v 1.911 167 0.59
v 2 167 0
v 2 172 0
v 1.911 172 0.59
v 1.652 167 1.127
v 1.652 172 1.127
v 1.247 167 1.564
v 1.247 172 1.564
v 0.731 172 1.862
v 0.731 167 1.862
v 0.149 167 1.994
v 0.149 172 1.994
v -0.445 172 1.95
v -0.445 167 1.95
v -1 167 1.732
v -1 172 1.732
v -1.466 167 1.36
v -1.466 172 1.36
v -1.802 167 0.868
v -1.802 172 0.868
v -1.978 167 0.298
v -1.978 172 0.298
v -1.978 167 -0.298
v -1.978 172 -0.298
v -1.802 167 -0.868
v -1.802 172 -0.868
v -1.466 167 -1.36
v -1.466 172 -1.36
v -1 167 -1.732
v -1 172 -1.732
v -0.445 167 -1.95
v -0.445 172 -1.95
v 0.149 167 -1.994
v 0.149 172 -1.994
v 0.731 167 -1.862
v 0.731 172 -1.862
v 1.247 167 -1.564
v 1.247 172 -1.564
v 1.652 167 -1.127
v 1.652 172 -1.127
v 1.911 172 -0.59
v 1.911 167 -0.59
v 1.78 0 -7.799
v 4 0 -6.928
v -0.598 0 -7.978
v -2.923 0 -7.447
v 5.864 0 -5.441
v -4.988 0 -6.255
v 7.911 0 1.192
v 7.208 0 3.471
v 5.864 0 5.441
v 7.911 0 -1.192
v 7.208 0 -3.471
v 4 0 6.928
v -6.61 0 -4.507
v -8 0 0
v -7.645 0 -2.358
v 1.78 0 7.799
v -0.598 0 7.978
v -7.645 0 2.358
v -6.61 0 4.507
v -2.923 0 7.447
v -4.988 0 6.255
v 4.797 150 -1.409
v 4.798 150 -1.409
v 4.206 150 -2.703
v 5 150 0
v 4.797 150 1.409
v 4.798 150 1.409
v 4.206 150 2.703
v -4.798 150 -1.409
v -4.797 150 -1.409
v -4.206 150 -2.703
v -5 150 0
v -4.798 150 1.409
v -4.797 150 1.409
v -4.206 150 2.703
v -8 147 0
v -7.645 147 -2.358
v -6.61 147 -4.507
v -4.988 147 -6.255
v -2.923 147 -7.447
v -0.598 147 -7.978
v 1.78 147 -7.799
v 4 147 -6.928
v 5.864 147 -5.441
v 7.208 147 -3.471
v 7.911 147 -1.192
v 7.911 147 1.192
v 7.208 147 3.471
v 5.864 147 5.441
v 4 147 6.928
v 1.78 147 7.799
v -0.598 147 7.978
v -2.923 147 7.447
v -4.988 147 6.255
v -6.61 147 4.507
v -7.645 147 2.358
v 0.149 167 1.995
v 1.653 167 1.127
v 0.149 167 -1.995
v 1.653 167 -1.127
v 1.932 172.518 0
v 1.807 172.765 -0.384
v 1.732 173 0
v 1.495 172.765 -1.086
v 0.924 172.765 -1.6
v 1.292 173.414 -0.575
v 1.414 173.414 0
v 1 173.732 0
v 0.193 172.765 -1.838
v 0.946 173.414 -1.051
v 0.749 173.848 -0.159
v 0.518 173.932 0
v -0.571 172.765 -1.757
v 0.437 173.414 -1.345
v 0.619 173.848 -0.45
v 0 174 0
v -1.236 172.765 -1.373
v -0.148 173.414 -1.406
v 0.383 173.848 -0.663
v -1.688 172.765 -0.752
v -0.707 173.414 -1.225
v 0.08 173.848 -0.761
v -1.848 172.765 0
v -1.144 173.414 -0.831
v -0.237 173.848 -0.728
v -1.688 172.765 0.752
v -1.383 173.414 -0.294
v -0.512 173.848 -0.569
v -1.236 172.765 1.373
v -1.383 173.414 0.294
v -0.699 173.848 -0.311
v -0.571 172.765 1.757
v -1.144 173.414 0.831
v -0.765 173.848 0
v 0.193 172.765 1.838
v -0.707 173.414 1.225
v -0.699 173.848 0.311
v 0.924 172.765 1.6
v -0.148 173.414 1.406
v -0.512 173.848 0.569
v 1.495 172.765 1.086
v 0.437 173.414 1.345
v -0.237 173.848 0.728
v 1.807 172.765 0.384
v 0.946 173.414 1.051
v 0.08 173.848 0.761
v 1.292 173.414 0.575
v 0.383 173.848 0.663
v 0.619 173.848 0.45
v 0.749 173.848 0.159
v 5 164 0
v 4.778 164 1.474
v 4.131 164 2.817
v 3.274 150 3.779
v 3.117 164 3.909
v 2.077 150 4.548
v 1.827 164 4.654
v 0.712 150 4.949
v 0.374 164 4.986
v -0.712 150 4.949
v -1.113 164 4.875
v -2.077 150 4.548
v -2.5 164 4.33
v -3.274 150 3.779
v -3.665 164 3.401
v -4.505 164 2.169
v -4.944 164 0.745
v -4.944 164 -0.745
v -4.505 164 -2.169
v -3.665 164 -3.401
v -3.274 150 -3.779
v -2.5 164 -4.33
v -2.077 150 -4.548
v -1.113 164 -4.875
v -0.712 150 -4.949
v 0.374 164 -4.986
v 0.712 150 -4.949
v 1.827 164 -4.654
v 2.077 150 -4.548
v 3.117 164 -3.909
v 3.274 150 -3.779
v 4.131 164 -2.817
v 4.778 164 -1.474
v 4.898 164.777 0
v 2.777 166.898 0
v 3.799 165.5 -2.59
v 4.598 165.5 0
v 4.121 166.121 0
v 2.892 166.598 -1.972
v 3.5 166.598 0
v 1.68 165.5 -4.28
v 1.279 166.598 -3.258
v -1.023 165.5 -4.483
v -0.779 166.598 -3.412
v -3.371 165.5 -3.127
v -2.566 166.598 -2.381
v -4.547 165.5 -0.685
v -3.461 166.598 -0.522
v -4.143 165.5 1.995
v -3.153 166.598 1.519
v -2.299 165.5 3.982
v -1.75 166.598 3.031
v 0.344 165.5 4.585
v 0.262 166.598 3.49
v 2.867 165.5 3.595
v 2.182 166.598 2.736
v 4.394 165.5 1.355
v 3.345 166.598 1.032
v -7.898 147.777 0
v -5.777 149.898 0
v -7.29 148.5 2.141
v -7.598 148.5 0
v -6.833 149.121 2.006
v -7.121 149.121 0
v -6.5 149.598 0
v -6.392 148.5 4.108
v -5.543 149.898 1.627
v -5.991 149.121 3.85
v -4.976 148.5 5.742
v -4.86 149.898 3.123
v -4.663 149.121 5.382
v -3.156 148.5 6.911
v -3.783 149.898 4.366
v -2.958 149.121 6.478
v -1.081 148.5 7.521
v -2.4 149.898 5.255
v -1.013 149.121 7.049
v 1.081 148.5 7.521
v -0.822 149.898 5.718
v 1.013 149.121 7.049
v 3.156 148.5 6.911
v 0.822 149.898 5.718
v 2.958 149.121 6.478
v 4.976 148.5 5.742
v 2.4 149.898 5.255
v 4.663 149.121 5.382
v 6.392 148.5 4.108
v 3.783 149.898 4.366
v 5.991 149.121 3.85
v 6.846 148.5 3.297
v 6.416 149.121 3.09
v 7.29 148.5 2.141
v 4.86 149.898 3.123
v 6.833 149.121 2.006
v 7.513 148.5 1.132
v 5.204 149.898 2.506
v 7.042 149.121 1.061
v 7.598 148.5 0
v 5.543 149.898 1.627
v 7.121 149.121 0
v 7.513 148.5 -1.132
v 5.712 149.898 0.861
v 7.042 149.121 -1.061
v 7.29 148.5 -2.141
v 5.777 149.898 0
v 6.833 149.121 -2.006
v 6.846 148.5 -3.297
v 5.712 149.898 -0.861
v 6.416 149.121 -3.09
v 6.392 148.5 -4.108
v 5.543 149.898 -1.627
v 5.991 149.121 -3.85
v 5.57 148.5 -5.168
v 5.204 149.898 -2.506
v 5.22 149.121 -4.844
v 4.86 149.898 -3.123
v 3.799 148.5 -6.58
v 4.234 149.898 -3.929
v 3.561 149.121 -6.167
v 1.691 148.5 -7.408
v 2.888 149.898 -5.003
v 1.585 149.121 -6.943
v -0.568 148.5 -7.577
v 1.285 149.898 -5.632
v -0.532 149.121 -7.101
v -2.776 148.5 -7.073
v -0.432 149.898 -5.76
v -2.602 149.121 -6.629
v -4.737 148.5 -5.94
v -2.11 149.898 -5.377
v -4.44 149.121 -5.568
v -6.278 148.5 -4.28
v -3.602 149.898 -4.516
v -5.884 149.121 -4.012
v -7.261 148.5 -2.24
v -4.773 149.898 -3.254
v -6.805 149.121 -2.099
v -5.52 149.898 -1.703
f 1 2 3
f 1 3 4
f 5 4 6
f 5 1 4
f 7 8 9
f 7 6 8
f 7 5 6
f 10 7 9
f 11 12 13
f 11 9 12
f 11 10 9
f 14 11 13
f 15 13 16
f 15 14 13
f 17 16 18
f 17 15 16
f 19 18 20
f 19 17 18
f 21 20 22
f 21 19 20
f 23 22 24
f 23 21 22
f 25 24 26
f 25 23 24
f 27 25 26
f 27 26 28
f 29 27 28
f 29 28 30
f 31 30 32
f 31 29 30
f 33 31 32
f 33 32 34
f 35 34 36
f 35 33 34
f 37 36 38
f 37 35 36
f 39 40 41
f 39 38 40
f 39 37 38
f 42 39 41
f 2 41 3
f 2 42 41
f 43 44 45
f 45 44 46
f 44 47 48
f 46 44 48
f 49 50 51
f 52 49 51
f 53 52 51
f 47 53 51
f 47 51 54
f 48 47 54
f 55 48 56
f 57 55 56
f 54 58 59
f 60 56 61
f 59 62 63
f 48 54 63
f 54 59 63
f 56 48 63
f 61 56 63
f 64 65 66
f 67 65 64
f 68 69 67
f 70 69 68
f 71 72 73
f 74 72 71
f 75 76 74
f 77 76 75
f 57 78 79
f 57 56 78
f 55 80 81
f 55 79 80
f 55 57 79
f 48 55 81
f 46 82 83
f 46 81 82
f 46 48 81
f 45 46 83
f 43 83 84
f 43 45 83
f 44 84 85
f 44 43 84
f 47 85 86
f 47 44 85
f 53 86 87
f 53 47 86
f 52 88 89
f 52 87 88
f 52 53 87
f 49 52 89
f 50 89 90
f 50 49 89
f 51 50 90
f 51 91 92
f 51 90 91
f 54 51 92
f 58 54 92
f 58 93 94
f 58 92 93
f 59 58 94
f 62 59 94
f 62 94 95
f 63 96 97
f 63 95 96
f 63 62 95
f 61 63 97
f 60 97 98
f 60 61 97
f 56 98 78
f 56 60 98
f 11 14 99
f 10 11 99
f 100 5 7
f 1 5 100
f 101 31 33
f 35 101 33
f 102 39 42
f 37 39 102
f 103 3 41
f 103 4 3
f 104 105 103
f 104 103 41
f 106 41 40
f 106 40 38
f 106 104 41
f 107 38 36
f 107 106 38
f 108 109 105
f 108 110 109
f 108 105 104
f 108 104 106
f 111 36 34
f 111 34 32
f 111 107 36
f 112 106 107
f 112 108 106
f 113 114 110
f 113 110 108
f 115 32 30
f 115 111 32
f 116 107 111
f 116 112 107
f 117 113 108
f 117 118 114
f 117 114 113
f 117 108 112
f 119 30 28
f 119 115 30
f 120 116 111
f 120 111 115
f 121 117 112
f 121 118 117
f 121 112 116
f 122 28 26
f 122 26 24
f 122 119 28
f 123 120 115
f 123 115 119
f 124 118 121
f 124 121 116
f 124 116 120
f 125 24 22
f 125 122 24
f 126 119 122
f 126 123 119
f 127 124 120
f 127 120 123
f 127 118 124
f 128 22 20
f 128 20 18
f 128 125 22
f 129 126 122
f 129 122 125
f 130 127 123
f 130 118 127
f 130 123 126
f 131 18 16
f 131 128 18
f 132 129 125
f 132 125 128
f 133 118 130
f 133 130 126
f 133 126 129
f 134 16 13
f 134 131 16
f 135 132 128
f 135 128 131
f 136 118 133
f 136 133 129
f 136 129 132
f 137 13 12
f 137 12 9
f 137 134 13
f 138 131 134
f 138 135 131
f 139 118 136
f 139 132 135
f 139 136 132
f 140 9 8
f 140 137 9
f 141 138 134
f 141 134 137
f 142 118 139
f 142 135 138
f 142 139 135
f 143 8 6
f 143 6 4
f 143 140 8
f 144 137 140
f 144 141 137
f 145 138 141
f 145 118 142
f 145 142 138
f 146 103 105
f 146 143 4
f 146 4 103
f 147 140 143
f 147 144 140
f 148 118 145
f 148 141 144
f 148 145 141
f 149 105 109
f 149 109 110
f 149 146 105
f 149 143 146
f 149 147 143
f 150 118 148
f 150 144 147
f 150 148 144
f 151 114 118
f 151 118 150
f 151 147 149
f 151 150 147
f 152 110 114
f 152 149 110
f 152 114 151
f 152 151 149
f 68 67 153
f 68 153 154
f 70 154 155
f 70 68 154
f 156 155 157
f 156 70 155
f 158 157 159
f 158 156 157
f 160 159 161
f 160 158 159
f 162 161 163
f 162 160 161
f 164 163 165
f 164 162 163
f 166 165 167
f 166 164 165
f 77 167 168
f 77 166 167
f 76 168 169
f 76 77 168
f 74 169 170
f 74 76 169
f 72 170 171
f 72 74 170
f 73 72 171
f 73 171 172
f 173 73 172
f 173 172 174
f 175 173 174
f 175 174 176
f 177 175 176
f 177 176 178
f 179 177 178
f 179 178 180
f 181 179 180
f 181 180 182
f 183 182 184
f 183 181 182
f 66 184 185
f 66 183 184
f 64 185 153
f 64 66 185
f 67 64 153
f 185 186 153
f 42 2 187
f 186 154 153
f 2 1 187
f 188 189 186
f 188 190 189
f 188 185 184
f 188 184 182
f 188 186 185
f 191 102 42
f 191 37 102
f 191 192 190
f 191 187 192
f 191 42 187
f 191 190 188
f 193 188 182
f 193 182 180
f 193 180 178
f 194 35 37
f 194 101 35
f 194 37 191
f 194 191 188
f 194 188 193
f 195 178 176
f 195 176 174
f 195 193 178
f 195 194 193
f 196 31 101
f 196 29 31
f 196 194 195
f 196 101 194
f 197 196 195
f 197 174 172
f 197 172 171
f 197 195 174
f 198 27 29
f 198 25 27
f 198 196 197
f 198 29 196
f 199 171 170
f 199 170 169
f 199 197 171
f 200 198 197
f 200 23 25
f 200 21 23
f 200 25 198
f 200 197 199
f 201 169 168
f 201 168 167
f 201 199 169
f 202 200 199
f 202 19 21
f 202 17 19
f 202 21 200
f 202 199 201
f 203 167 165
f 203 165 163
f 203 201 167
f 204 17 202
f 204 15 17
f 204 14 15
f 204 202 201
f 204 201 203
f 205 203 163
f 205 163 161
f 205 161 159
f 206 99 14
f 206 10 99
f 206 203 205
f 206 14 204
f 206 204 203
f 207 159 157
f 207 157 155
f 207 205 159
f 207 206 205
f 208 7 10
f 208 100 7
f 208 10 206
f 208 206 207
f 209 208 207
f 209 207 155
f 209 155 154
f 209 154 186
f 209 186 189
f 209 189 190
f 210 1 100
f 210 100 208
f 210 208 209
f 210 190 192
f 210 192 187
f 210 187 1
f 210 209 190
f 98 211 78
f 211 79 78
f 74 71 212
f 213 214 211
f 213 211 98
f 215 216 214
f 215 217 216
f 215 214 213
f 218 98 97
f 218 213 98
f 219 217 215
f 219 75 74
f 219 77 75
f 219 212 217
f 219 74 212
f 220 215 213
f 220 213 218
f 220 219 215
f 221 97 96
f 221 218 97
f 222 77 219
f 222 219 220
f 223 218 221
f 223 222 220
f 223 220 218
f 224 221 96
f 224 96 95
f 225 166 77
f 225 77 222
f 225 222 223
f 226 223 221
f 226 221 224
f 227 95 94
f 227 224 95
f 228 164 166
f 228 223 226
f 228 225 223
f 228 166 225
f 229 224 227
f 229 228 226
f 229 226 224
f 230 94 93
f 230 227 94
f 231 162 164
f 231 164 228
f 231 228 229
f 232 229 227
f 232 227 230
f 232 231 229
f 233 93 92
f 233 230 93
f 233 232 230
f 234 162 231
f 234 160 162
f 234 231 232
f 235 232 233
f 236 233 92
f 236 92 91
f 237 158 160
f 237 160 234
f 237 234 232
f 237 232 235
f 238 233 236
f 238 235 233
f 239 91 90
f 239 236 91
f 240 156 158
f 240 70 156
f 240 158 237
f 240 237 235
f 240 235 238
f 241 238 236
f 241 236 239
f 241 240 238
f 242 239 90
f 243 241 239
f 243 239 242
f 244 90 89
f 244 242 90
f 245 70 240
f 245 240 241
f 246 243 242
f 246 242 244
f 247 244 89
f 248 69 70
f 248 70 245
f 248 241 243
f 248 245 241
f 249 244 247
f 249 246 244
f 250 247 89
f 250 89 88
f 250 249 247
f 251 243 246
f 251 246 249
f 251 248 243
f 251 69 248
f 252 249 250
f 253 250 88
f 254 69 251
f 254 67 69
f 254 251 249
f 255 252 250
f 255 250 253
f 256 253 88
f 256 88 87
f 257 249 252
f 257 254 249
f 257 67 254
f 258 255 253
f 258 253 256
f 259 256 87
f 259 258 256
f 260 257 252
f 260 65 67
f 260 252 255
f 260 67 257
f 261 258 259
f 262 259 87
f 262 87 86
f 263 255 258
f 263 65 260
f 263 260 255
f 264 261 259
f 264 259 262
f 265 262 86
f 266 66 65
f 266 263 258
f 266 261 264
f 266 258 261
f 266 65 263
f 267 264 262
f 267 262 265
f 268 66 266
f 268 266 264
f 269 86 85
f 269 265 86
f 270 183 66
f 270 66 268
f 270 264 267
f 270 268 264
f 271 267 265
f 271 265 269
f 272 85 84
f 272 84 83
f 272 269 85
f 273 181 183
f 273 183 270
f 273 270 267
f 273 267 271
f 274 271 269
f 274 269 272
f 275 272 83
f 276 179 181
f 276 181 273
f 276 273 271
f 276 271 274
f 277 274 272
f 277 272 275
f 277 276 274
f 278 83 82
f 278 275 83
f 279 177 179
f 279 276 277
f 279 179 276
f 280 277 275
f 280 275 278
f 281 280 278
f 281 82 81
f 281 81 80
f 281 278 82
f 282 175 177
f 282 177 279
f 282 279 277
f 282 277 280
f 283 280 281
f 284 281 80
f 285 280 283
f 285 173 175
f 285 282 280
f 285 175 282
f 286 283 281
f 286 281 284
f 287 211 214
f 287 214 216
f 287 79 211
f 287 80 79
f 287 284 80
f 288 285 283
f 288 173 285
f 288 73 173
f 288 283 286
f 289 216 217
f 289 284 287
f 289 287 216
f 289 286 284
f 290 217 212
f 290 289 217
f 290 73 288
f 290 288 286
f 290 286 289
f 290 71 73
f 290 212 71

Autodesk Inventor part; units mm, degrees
ref_plane "YZ Plane" through (0, 0, 0) normal (1, 0, 0) x (0, 1, 0)
ref_plane "XZ Plane" through (0, 0, 0) normal (0, 1, 0) x (-1, 0, 0)
ref_plane "XY Plane" through (0, 0, 0) normal (0, 0, 1) x (1, 0, 0)
sketch "Sketch1" plane through (0, 0, 0) normal (0, 1, 0) x (-1, 0, 0)
  circle A0 centre (0, 0) radius 8
  dimension "d0" = 16
extrude "Extrusion1" add sketch "Sketch1" along normal blind 150
sketch "Sketch2" plane through (0, 150, 0) normal (0, 1, 0) x (1, 0, 0)
  circle A0 centre (0, 0) radius 8 projected
  circle A1 centre (0, 0) radius 5
  dimension "d3" = 10
extrude "Extrusion2" add sketch "Sketch2" along normal blind 17 contours A1
sketch "Sketch3" plane through (0, 167, 0) normal (0, 1, 0) x (1, 0, 0)
  circle A0 centre (0, 0) radius 5 projected
  circle A1 centre (0, 0) radius 2
  dimension "d6" = 4
extrude "Extrusion3" add sketch "Sketch3" along normal blind 7 contours A1
fillet "Fillet1" radius 3 1 edges at (8, 150, 0)
fillet "Fillet2" radius 3 1 edges at (-5, 167, 0)
fillet "Fillet3" radius 2 1 edges at (-2, 174, 0)
properties part number "pen_pentel_knockle"
